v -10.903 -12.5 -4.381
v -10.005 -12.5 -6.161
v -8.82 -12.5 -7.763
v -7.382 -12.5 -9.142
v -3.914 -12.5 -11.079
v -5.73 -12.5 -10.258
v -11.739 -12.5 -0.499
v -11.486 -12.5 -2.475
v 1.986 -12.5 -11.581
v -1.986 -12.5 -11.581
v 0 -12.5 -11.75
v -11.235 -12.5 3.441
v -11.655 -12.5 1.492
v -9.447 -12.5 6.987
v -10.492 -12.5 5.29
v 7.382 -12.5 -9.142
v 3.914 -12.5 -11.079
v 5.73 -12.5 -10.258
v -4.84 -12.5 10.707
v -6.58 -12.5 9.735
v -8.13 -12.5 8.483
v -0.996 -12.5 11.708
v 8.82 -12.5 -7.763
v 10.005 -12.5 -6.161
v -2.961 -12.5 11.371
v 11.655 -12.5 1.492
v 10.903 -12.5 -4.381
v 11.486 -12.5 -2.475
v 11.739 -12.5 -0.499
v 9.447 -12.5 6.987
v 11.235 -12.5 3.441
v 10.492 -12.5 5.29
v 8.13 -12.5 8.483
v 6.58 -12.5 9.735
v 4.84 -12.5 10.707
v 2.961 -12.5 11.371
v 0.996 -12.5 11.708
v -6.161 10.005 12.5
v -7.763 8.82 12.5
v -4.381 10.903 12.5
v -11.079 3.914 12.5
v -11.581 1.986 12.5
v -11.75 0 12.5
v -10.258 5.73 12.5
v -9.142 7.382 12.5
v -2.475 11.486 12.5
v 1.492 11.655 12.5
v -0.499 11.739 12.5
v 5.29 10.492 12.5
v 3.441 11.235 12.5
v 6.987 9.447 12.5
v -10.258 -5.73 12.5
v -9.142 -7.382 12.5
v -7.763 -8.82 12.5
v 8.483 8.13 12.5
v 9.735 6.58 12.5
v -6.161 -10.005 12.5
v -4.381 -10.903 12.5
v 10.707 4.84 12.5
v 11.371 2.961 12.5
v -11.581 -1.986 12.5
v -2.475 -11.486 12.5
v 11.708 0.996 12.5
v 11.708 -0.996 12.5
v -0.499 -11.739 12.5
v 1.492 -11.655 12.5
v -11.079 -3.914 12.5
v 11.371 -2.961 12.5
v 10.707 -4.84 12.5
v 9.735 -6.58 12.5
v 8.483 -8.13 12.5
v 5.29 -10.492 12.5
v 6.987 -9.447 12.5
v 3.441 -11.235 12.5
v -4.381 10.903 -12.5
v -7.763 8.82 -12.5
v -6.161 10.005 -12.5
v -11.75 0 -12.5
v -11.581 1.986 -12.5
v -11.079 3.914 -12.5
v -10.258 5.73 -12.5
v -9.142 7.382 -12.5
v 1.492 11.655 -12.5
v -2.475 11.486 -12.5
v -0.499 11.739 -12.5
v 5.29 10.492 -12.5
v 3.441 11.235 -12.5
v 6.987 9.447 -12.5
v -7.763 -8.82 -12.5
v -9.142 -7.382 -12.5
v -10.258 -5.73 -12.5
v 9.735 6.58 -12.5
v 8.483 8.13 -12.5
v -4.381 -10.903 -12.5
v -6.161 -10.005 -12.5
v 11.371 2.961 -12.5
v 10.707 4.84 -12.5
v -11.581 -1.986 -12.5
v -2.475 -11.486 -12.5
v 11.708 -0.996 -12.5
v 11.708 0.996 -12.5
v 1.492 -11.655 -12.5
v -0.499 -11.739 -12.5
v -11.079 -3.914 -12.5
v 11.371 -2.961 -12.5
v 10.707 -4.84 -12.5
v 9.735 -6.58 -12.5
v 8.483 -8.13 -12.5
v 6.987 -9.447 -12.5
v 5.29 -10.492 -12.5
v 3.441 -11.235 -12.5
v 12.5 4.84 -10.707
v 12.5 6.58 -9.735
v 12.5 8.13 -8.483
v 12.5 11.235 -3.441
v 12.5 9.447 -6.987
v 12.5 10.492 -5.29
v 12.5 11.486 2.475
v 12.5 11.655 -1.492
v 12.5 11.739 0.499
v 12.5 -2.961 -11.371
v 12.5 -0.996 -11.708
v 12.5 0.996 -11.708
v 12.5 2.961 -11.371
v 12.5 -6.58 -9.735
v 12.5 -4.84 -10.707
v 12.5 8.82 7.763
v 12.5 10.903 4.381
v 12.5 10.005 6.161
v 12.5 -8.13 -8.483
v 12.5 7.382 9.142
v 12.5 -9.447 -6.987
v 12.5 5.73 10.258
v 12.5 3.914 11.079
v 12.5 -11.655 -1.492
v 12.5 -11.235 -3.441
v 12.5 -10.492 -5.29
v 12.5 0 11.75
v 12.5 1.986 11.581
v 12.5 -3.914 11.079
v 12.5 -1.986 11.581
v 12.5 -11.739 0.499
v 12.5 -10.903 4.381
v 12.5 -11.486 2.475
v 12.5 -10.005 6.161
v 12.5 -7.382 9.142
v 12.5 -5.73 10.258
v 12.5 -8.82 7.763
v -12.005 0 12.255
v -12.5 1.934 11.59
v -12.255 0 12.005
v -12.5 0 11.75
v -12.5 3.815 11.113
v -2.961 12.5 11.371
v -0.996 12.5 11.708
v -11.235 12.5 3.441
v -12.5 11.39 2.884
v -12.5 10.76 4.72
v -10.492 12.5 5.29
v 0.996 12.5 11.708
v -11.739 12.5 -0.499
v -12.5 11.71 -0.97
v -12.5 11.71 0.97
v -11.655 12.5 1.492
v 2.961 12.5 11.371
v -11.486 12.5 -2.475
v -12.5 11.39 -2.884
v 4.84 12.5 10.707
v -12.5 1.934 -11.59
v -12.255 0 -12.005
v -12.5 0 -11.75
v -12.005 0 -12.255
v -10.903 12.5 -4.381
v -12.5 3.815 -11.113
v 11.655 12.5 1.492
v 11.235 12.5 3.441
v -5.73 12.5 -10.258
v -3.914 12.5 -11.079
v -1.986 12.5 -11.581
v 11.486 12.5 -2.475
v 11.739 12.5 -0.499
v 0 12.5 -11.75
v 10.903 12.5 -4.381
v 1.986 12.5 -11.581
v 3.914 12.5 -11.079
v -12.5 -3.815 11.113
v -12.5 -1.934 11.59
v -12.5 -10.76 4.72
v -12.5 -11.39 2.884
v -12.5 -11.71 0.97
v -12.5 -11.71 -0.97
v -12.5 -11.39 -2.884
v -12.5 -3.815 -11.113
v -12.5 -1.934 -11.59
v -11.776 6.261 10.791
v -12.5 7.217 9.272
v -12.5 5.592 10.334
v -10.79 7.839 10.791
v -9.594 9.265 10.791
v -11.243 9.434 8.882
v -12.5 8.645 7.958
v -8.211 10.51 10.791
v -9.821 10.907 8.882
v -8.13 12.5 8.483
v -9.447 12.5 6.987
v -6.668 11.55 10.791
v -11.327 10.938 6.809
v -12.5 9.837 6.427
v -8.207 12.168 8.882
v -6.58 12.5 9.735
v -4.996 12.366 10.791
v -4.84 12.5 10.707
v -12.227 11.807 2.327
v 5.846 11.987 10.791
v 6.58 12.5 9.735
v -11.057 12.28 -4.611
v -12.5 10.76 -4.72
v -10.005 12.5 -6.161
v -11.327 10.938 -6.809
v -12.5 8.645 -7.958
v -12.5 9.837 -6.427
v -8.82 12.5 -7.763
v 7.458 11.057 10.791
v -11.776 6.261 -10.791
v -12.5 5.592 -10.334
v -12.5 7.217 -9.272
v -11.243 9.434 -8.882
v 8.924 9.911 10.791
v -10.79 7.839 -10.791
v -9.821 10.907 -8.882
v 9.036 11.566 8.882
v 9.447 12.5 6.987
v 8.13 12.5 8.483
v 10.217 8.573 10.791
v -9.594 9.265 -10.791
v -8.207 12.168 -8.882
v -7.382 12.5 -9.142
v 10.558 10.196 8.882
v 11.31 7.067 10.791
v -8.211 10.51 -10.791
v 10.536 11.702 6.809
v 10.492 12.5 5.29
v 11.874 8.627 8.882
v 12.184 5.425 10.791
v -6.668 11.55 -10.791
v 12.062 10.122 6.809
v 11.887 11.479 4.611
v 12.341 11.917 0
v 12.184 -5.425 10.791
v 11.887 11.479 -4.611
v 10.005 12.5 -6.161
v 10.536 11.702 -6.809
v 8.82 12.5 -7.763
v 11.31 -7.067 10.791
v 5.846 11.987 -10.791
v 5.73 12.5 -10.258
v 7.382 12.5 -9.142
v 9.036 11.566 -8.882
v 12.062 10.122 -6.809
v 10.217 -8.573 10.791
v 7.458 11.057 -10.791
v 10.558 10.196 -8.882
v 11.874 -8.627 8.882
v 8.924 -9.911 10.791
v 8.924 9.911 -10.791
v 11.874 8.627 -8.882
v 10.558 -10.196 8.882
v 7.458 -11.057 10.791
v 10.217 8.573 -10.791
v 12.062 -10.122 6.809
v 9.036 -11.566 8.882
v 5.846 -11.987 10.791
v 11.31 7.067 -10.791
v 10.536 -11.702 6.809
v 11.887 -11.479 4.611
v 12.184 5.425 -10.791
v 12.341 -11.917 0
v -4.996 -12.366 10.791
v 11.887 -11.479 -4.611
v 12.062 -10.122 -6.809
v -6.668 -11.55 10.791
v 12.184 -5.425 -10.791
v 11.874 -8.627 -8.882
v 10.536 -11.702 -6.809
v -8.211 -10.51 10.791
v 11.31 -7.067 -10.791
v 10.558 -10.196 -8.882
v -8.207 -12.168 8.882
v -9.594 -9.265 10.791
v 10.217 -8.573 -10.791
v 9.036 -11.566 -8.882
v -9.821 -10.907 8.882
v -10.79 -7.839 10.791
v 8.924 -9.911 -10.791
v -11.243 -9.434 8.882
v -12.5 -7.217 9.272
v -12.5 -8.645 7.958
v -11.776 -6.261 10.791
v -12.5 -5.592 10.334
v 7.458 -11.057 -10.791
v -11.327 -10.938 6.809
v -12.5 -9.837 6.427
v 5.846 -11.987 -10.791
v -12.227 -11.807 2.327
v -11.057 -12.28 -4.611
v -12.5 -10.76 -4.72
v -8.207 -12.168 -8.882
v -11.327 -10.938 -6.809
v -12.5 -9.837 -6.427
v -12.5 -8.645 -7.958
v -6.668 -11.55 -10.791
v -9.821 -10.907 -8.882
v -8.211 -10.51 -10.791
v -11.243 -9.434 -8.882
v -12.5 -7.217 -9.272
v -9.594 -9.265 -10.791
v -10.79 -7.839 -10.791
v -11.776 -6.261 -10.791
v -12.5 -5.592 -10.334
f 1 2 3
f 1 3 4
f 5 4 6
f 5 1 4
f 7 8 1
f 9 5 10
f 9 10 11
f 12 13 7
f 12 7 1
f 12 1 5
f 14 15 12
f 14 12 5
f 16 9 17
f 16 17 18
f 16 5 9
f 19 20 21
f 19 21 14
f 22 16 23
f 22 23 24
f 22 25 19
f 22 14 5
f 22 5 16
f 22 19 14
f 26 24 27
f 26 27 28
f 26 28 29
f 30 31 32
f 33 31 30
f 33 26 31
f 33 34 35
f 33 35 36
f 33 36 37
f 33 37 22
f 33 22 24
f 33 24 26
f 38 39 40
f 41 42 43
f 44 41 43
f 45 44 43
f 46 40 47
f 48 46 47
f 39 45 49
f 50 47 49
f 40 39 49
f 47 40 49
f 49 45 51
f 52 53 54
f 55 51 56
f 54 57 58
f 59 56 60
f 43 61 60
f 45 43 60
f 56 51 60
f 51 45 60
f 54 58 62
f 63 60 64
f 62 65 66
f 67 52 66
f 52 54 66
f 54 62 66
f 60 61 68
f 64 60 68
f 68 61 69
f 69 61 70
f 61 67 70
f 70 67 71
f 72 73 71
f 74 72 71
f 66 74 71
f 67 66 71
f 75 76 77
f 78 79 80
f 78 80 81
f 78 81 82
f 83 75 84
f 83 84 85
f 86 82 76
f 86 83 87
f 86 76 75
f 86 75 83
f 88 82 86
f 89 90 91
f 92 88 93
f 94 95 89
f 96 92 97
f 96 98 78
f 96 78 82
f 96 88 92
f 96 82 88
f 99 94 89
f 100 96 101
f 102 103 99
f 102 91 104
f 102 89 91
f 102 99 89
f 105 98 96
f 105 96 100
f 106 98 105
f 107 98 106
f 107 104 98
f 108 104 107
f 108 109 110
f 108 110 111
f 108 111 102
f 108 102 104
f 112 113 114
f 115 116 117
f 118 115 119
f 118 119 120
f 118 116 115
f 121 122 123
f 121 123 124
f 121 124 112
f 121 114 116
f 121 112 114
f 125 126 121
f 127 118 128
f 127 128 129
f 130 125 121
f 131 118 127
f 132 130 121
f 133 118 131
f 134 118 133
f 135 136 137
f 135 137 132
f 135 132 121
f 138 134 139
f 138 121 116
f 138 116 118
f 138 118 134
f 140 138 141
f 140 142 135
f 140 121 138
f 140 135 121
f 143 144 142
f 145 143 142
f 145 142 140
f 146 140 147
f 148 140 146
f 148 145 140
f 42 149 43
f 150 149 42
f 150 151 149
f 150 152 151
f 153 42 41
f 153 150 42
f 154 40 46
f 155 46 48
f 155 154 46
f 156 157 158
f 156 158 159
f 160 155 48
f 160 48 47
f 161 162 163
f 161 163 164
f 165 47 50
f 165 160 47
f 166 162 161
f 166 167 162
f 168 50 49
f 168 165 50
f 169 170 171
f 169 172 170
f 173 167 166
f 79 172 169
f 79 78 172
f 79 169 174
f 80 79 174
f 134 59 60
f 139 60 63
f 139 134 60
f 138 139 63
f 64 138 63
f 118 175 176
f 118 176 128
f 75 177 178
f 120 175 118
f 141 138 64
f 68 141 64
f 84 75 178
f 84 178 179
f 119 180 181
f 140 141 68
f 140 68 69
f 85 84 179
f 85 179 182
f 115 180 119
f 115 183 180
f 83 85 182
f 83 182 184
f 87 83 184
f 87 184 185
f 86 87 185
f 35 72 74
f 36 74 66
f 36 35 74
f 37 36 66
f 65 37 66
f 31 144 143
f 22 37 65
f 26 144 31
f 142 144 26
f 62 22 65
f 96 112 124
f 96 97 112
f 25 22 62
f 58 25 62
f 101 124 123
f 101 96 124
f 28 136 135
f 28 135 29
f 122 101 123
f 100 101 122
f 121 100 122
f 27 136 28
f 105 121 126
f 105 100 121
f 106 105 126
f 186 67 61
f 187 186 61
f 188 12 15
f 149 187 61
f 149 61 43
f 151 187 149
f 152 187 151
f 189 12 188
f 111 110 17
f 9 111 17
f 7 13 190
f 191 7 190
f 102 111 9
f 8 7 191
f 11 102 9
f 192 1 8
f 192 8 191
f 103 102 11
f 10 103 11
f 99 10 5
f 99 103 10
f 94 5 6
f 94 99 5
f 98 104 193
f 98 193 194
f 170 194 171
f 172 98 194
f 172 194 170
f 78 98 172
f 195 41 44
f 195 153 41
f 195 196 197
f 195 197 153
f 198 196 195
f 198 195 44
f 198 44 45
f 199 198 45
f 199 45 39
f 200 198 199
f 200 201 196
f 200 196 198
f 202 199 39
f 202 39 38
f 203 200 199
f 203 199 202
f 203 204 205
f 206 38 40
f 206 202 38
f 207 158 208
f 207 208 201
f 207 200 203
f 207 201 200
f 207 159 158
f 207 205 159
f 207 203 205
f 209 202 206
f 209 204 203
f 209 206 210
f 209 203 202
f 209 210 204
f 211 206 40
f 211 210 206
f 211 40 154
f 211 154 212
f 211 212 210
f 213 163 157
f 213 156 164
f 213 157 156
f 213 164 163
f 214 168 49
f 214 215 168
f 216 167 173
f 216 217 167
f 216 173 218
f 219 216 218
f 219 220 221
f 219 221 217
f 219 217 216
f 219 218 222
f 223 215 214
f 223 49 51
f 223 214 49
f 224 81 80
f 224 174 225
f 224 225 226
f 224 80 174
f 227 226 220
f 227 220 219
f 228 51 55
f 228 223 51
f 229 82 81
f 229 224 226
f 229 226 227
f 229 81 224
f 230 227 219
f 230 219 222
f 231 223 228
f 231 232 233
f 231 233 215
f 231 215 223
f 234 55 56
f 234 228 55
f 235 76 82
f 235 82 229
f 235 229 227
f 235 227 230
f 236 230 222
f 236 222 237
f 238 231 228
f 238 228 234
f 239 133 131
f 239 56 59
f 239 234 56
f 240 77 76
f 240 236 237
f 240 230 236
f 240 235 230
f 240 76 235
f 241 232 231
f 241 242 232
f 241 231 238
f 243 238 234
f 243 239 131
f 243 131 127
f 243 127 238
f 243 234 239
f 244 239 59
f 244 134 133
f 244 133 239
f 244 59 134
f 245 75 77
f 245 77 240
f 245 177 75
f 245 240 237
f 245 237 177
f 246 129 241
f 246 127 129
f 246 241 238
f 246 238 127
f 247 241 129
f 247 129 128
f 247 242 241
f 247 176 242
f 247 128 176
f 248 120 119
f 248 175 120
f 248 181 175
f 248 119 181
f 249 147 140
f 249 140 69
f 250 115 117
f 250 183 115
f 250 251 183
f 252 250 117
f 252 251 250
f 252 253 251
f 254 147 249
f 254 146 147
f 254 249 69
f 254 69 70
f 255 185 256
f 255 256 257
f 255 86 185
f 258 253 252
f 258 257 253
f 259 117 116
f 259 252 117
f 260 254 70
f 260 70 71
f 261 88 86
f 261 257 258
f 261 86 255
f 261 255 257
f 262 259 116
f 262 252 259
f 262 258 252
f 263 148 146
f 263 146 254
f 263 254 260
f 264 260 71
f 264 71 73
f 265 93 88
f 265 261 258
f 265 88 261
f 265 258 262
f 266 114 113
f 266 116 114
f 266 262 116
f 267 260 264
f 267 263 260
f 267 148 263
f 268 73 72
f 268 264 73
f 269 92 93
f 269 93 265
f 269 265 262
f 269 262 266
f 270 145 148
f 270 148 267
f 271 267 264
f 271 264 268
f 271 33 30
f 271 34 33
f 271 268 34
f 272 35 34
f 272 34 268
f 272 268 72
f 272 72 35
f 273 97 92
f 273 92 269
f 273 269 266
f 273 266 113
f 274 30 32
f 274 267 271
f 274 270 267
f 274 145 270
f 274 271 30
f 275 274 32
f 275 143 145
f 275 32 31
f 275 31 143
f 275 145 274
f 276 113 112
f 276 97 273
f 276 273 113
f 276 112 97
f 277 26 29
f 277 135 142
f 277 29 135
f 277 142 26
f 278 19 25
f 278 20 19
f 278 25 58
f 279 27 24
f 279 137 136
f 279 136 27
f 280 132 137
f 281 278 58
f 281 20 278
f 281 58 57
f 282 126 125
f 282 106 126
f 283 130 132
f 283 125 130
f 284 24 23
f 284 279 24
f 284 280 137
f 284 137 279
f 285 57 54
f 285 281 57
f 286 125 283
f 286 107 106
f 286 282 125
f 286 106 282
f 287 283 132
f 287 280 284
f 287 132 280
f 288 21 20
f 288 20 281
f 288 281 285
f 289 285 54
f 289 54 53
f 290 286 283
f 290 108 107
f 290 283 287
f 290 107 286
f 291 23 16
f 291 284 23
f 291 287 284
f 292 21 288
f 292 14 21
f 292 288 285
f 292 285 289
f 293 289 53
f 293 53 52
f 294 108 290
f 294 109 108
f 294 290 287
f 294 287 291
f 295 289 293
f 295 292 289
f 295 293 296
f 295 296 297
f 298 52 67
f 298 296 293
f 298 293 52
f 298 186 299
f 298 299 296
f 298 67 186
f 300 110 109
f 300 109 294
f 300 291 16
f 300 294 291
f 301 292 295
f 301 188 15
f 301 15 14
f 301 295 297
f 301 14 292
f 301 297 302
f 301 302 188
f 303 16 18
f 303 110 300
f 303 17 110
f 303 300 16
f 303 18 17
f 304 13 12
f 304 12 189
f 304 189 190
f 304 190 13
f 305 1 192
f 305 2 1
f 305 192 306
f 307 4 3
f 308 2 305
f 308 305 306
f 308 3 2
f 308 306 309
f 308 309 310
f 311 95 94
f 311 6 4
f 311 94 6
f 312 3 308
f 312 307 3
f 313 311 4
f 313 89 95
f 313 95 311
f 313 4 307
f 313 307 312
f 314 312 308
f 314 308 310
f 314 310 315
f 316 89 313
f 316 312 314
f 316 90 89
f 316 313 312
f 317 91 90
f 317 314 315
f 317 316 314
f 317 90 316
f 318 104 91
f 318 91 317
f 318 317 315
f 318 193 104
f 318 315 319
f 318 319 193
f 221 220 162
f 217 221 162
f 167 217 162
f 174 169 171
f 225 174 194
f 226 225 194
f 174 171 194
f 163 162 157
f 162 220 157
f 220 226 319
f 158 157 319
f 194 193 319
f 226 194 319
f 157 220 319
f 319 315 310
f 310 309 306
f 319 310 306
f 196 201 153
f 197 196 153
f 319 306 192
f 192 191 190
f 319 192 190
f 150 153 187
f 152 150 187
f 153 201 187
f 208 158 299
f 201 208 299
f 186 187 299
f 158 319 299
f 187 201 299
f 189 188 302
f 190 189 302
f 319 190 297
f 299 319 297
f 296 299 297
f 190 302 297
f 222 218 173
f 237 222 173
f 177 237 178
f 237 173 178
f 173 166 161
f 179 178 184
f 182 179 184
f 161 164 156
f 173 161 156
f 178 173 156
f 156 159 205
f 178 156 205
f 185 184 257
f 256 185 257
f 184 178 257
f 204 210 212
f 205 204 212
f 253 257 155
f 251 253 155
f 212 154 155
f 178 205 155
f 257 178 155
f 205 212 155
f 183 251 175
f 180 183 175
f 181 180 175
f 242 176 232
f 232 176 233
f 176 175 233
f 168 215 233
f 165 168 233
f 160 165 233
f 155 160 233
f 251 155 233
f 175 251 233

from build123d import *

# Parameters (mm, degrees)
F0_W     = 25
F0_H     = 25
F1_DEPTH = 12.5


with BuildPart() as f1:
    # F0 (on Front) → F1 (new body, symmetric)
    with BuildSketch(Plane.XZ):
        Rectangle(F0_W, F0_H)
    extrude(amount=F1_DEPTH, both=True)

    # F2 (on Front) → F3 (revolve, intersect)
    with BuildSketch(Plane.XZ):
        with BuildLine():
            Line((0, -17.155538), (0, 17.155538))
            ThreePointArc((0, 17.155538), (-17.155538, 0), (0, -17.155538))
        make_face()
    revolve(axis=Axis((0, 0, 0), (0, 0, -1)), mode=Mode.INTERSECT)


solid = f1.part
